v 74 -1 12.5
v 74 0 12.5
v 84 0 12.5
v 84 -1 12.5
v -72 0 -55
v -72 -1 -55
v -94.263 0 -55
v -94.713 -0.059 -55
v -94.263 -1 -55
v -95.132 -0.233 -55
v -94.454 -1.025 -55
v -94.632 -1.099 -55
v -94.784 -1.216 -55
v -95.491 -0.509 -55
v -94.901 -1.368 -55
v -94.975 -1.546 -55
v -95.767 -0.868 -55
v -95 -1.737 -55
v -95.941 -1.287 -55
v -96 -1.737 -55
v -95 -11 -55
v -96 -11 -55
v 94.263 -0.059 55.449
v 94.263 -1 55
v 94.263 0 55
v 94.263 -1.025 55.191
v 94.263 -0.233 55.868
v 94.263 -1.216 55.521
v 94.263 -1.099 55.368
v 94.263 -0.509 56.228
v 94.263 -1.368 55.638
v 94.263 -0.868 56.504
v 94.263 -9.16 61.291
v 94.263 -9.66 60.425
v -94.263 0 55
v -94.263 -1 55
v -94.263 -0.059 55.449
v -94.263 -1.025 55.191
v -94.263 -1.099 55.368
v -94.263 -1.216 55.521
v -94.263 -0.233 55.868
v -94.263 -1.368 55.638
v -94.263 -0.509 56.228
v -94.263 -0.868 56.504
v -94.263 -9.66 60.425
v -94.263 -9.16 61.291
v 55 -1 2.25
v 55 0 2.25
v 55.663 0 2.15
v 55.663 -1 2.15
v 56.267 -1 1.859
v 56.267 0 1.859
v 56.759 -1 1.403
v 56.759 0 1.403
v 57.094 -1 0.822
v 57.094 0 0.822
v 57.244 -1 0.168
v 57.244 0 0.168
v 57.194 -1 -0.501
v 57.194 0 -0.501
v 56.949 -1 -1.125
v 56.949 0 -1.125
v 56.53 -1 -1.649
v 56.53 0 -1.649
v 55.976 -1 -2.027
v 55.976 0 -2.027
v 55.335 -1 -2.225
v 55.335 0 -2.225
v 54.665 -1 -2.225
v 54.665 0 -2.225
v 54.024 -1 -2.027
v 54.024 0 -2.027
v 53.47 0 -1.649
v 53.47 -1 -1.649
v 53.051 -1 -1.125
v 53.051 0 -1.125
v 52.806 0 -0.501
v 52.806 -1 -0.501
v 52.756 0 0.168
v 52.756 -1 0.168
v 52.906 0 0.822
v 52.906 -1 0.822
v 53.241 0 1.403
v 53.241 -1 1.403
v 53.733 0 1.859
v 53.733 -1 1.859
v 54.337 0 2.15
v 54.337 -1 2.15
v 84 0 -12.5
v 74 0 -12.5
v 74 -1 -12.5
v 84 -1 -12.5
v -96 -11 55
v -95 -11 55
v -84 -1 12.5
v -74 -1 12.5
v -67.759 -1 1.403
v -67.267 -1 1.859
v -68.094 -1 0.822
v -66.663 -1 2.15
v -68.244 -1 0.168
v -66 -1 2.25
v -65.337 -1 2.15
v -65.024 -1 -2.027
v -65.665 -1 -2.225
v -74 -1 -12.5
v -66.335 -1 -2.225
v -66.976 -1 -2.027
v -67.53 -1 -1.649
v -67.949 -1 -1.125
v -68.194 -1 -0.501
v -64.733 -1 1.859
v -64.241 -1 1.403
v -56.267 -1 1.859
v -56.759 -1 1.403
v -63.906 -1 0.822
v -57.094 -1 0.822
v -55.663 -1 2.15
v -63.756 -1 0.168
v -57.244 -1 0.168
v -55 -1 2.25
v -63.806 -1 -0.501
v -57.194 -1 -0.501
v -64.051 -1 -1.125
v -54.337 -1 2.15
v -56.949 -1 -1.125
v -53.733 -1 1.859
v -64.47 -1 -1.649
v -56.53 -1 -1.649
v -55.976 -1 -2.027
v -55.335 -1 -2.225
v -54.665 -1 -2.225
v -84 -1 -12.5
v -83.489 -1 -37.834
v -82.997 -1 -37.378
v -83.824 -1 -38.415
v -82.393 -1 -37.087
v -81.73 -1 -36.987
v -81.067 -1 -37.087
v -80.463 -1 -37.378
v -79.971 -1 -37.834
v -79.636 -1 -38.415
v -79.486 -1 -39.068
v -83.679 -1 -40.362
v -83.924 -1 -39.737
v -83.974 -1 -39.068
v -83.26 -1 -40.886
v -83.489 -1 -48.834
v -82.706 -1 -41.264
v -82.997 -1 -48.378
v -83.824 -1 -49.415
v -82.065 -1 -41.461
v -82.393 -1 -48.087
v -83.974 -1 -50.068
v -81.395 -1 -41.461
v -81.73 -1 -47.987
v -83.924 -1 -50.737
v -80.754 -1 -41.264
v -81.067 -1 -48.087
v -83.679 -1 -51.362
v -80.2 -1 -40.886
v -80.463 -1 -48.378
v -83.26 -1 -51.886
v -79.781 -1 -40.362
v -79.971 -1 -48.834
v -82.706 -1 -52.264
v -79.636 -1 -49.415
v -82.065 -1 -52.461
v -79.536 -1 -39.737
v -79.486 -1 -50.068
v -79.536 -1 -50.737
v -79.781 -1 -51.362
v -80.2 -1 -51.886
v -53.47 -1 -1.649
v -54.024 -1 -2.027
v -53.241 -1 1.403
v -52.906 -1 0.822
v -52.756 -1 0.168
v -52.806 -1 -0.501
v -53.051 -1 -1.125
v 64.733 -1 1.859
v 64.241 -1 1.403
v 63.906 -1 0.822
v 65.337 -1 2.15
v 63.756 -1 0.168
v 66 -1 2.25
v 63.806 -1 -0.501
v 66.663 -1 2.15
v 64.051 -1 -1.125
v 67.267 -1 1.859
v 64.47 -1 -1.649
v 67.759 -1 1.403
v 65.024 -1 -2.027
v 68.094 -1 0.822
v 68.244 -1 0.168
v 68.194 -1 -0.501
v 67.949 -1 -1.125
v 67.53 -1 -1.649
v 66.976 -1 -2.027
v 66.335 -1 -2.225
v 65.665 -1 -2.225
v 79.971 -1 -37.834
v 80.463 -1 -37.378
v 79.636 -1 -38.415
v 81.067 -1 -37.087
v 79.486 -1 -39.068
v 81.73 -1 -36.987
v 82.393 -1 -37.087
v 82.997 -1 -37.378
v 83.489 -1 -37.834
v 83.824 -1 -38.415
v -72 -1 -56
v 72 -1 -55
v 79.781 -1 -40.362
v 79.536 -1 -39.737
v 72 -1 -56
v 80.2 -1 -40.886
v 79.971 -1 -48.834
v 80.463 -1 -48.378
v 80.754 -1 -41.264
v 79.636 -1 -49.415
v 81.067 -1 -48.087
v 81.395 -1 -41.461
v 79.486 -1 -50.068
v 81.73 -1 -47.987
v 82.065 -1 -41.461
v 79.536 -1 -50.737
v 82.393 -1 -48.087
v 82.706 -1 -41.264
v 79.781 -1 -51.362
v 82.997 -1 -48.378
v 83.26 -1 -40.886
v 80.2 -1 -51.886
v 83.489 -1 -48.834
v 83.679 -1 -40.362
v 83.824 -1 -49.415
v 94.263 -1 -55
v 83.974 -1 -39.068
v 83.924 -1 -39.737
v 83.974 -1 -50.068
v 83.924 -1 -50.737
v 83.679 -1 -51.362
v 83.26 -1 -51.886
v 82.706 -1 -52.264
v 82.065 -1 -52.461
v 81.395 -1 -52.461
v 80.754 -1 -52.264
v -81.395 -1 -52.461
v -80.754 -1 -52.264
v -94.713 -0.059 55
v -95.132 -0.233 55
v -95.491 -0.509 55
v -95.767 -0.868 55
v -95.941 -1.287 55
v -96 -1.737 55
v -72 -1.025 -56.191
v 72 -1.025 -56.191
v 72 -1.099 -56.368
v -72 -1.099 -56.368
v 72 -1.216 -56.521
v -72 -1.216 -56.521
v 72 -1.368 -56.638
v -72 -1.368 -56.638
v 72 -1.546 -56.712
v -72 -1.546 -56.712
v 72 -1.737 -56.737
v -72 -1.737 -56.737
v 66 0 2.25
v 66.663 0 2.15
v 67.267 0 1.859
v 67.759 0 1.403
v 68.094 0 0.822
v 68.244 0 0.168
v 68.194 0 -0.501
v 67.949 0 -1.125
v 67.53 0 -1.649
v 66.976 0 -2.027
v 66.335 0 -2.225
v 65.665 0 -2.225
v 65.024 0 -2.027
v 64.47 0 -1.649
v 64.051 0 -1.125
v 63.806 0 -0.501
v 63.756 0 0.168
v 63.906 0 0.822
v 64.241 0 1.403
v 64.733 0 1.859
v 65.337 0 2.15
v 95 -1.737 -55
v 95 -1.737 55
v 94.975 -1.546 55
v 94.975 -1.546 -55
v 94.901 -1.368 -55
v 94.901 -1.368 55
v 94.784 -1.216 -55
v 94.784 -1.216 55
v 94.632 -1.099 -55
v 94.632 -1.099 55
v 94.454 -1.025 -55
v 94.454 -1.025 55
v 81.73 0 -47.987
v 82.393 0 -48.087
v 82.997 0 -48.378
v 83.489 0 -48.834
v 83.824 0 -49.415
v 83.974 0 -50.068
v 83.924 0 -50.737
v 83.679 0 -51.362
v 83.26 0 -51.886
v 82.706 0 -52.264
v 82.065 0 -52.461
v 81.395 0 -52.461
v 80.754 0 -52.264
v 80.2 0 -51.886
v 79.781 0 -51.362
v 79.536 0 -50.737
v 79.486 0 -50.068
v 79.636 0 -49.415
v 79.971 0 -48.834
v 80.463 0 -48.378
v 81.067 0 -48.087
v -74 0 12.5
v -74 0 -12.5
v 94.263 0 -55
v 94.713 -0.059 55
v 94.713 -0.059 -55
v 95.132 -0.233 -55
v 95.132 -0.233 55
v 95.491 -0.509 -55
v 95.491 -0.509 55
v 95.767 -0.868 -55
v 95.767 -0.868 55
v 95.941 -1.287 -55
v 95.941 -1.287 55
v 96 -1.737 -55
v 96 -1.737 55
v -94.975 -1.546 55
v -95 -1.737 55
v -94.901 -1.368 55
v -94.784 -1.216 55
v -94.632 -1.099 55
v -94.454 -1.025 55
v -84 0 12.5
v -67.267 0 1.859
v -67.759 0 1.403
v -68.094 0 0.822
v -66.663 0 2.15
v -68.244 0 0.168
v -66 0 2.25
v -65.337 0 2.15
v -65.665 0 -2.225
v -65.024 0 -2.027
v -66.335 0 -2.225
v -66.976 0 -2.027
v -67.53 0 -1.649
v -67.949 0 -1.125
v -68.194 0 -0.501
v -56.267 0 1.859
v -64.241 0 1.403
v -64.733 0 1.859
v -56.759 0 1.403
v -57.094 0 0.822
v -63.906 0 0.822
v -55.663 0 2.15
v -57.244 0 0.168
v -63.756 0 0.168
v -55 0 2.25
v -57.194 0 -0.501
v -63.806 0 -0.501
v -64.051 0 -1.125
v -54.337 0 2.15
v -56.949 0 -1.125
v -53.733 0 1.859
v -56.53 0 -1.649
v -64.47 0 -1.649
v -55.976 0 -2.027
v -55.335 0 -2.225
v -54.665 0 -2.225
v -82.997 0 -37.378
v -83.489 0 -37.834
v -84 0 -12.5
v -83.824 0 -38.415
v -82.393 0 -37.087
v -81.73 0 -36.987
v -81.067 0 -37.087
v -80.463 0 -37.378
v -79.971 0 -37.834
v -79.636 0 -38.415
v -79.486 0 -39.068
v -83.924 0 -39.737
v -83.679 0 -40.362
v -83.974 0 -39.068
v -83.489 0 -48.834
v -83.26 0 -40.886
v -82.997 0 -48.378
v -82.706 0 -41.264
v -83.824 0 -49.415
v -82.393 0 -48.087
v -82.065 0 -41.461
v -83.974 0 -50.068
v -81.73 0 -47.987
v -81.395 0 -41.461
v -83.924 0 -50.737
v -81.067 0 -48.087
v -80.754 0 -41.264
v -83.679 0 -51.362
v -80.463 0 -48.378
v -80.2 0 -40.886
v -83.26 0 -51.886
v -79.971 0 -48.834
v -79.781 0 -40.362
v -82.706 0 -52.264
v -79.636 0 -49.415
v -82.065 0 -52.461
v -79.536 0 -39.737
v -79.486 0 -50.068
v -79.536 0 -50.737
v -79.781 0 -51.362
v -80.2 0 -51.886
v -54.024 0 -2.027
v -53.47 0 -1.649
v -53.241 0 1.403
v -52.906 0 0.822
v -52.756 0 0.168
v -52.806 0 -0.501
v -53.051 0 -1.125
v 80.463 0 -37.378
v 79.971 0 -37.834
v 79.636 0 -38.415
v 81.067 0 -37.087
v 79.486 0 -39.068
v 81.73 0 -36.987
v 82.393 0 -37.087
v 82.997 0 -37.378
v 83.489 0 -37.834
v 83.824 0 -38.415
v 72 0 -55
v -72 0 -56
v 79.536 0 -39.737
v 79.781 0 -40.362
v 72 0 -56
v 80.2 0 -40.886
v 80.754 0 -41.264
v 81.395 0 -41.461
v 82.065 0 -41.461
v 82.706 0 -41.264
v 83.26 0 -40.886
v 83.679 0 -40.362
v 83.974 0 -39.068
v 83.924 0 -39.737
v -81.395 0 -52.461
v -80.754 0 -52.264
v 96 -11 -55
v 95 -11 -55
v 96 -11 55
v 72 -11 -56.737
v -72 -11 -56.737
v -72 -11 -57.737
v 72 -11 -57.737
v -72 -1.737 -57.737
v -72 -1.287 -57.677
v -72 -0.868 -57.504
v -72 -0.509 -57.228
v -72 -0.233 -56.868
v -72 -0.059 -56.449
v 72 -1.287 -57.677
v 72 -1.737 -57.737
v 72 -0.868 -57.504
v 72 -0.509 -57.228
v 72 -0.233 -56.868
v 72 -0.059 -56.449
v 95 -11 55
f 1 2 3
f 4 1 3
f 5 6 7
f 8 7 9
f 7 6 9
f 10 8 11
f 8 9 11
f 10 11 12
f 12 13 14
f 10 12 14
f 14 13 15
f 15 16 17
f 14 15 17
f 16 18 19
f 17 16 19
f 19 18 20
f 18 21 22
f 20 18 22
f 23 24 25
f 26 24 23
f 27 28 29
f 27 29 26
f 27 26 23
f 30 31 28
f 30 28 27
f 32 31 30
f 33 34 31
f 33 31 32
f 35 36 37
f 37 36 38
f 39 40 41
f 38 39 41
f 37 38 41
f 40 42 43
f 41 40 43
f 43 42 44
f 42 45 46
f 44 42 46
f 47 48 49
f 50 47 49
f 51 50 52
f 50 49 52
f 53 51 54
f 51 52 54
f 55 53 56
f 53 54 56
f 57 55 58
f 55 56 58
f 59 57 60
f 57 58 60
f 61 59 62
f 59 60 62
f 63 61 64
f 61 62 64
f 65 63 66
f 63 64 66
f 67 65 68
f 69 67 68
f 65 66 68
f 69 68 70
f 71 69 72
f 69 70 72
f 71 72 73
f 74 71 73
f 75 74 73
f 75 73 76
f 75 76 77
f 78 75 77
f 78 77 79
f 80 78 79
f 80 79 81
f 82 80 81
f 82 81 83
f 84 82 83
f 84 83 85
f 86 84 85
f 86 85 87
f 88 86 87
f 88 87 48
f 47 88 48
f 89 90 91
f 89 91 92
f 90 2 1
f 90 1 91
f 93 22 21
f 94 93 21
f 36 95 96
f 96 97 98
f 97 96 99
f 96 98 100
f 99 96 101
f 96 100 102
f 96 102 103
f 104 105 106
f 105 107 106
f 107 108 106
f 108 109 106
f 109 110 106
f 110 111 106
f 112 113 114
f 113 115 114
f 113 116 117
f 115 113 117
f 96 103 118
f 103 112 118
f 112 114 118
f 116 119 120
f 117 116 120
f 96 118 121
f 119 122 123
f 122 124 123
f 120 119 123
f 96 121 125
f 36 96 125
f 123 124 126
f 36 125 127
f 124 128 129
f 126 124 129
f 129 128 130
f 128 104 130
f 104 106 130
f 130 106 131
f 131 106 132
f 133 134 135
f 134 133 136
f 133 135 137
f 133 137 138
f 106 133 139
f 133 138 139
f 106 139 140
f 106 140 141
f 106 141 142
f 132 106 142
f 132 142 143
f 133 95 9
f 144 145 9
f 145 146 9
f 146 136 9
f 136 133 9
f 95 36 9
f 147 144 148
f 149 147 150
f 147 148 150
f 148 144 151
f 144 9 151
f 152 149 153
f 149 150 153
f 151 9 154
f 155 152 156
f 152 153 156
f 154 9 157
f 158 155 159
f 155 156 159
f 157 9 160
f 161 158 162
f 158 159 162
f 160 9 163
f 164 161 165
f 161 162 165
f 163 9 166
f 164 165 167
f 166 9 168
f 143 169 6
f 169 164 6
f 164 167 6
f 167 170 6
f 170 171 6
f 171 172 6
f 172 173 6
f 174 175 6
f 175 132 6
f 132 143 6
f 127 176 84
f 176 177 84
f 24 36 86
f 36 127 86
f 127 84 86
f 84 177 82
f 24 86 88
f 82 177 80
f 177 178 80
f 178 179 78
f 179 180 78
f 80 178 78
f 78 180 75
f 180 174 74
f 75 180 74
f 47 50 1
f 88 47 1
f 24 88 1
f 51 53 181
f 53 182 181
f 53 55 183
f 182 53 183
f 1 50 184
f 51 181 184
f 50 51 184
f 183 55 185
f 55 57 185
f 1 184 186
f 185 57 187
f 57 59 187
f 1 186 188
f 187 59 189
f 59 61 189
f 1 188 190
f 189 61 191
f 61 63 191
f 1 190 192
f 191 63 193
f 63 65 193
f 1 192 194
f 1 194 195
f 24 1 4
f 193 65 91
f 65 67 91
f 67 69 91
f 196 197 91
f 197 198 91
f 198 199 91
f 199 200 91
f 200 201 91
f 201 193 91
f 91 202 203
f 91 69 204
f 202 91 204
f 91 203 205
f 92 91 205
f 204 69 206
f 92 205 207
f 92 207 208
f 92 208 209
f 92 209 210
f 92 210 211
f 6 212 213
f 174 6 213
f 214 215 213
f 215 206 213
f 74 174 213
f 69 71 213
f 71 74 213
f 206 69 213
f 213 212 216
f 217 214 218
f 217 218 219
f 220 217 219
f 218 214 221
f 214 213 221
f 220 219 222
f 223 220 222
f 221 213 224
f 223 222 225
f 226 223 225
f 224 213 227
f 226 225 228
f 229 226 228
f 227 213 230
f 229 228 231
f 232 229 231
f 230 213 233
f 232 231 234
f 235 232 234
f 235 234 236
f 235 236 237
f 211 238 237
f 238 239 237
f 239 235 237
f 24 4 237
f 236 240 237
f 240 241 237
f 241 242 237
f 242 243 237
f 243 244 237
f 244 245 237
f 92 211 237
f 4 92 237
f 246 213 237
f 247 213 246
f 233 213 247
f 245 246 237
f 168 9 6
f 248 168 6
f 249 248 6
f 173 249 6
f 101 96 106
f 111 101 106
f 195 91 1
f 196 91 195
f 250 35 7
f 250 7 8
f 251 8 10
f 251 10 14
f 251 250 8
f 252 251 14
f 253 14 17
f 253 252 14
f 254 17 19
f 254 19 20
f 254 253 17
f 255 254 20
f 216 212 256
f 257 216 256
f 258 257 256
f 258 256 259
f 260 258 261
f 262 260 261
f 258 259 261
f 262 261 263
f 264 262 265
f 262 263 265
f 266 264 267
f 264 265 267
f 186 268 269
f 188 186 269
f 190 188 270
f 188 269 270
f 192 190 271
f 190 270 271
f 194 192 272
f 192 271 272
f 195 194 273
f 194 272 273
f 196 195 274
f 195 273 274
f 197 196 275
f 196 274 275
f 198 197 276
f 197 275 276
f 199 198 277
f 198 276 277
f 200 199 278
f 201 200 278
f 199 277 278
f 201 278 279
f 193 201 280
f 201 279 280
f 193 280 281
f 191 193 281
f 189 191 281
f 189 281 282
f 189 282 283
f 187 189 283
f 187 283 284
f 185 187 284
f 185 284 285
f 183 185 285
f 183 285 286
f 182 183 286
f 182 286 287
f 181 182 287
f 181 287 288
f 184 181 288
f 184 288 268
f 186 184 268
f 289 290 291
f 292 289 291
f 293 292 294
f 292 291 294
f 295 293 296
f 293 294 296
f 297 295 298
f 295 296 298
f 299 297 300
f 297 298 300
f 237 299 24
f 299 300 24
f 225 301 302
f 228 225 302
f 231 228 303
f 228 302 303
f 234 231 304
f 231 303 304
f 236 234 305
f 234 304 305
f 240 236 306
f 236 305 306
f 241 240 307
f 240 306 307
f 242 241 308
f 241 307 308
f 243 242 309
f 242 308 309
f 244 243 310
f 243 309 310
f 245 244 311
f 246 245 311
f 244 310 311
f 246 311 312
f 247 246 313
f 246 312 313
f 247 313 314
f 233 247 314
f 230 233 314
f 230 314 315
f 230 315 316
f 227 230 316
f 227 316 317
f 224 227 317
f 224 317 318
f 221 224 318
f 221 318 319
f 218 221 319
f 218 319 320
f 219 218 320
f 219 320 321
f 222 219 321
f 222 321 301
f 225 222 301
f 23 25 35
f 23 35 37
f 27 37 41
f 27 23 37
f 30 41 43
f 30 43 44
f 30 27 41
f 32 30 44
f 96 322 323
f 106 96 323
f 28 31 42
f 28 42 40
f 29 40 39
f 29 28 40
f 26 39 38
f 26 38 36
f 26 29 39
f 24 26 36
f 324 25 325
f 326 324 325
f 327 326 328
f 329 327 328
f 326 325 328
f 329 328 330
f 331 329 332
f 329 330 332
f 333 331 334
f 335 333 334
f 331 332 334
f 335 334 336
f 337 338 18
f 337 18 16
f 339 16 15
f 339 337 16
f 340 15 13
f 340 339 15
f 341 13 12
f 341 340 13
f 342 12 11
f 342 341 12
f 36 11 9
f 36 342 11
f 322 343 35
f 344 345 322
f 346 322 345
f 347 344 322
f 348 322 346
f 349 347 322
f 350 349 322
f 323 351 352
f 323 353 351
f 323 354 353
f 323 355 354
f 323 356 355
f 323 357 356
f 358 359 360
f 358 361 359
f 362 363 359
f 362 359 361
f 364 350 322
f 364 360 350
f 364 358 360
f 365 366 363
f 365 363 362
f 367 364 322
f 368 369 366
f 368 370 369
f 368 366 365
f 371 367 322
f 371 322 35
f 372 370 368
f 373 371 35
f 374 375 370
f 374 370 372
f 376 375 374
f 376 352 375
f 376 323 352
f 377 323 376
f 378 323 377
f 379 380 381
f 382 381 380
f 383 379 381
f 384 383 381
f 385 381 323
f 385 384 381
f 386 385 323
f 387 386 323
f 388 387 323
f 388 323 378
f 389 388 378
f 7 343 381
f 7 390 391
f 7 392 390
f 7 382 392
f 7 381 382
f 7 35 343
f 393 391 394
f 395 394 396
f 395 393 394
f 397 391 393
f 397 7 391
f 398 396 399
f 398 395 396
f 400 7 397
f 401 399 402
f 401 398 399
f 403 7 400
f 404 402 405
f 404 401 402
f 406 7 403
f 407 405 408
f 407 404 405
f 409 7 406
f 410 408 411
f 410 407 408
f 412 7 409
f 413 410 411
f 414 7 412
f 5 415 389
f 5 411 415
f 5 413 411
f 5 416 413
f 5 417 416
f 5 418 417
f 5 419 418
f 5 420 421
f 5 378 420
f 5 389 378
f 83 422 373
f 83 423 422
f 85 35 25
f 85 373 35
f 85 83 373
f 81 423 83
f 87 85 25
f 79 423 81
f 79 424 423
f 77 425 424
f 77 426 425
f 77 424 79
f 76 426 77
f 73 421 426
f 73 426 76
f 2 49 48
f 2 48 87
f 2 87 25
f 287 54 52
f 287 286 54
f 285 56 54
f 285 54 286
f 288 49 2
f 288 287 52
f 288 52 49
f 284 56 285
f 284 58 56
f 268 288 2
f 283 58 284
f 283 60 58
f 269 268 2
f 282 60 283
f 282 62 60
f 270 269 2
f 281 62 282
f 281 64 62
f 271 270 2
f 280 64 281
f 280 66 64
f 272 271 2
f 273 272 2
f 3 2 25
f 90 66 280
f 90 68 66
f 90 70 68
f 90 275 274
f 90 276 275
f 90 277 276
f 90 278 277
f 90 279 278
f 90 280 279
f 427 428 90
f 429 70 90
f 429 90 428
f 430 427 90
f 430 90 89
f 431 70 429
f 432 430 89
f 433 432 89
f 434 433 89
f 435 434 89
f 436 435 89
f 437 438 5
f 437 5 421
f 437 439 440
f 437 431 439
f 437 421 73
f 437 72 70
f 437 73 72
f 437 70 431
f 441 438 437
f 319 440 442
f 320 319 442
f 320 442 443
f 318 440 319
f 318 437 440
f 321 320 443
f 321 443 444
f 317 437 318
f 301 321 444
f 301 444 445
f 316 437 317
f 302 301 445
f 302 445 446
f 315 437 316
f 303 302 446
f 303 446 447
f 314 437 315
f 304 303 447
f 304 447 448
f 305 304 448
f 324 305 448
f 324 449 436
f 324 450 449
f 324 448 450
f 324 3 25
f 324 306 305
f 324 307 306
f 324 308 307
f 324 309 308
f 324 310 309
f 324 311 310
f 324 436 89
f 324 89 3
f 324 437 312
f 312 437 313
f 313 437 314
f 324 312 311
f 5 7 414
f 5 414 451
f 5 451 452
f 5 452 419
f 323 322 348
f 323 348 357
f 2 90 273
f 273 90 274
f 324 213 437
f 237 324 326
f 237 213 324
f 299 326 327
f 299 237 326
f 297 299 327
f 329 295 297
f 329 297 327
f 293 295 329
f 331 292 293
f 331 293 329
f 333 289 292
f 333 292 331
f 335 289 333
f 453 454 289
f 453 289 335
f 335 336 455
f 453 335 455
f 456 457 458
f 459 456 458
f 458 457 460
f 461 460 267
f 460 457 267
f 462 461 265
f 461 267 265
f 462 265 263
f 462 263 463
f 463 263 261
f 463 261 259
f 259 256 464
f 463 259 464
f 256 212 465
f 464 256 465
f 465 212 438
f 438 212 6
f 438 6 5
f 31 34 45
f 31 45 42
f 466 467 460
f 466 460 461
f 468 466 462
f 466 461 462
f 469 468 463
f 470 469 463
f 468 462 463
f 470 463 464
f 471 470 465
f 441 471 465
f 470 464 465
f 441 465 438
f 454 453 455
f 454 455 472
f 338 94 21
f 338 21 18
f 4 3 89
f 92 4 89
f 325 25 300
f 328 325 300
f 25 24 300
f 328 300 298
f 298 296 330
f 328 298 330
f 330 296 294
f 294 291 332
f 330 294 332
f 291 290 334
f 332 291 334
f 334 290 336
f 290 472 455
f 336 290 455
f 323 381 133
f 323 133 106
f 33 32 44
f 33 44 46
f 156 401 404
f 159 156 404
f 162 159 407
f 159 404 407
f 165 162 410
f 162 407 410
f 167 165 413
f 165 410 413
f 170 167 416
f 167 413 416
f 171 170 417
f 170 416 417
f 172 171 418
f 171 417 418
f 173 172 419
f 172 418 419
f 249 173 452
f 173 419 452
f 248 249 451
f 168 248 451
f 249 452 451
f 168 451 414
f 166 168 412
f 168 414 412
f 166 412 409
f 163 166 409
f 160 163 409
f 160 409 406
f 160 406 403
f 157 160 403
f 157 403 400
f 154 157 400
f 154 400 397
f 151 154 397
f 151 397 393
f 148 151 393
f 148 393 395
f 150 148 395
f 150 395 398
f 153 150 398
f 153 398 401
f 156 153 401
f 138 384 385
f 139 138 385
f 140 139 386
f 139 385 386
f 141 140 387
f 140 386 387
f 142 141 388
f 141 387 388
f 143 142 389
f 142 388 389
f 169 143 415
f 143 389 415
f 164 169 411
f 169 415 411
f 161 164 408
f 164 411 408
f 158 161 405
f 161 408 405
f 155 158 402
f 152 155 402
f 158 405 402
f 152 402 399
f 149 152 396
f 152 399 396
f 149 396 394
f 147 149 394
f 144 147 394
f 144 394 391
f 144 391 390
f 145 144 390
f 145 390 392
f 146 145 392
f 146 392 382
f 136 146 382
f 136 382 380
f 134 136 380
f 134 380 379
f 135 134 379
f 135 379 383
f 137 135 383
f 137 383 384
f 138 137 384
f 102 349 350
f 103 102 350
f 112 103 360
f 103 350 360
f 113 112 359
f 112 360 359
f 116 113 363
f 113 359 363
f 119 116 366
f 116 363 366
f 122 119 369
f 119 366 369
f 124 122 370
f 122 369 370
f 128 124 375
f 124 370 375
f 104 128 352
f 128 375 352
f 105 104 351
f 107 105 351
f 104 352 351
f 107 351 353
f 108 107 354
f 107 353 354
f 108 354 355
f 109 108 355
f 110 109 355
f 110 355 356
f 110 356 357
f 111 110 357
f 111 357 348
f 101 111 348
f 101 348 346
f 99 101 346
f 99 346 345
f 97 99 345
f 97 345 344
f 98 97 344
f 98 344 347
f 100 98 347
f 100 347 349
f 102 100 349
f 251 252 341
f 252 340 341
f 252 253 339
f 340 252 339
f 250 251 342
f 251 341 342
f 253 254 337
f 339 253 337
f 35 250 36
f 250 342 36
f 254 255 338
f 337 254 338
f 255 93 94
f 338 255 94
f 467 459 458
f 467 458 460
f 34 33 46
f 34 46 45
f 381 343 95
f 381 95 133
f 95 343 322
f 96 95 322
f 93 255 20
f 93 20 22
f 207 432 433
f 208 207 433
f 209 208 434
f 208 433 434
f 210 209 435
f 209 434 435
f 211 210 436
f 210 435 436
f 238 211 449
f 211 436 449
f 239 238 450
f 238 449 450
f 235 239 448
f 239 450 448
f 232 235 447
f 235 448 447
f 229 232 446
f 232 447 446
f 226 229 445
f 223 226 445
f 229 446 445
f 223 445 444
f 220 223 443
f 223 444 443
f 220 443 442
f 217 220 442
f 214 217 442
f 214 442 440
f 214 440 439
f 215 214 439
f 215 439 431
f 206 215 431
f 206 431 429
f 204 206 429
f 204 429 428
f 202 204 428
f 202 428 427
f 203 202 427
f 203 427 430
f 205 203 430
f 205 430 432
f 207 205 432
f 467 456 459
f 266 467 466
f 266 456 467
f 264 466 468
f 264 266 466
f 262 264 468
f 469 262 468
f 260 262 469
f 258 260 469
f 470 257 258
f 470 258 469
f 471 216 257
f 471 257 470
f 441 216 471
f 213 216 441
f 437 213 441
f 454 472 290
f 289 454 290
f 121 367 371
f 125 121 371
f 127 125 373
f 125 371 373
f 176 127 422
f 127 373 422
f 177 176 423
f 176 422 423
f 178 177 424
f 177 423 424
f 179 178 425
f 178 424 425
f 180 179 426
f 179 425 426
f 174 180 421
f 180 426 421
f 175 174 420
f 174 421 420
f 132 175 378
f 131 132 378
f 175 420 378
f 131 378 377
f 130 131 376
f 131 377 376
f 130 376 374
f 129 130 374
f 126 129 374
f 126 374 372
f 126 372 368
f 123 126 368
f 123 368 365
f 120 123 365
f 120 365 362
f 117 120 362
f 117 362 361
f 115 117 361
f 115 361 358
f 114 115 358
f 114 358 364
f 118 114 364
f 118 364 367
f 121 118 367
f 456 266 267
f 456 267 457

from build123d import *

# Parameters (mm, degrees)
SKETCH1_W                    = 190
SKETCH1_H                    = 110
BASE_FLANGE1_DEPTH           = 1
EDGE_FLANGE1_START           = -72
EDGE_FLANGE1_DEPTH           = 144
EDGE_FLANGE2_STRIP_W         = 5.4732
EDGE_FLANGE2_STRIP_H         = 1
EDGE_FLANGE2_STRIP_CUT_DEPTH = 110
EDGE_FLANGE2_DEPTH           = 110
EDGE_FLANGE3_DEPTH           = 188.5268
SKETCH17_R                   = 2.25
SKETCH17_W                   = 10
SKETCH17_H                   = 25
CUT_EXTRUDE1_DEPTH           = 115.427372832
SKETCH18_R                   = 2.25
CUT_EXTRUDE2_DEPTH           = 115.427372832


# Read off the part's stored shape, not the designer's step: Edge-Flange1
# Sheet-metal steps are written as plain solids
with BuildPart() as part:
    # Sketch1 → Base-Flange1 (new body)
    with BuildSketch(Plane(origin=(0, 0, 0), x_dir=(1, 0, 0), z_dir=(0, 1, 0))):
        Rectangle(SKETCH1_W, SKETCH1_H)
    extrude(amount=-BASE_FLANGE1_DEPTH)

    # Edge-Flange1 outline → Edge-Flange1 (add)
    with BuildSketch(Plane.YZ.offset(EDGE_FLANGE1_START)):
        with BuildLine():
            Line((-11, -57.7366), (-1.7366, -57.7366))
            ThreePointArc((-1.7366, -57.7366), (-0.508638364, -57.227961636), (0, -56))
            Line((0, -56), (0, -55))
            Line((0, -55), (-1, -55))
            Line((-1, -55), (-1, -56))
            ThreePointArc((-1, -56), (-1.215745145, -56.520854855), (-1.7366, -56.7366))
            Line((-1.7366, -56.7366), (-11, -56.7366))
            Line((-11, -56.7366), (-11, -57.7366))
        make_face()
    extrude(amount=EDGE_FLANGE1_DEPTH)

    # Edge-Flange2 strip (across the edge) → Edge-Flange2 strip cut (cut)
    with BuildSketch(Plane(origin=(-95, -1, 55), x_dir=(1, 0, 0), z_dir=(0, 0, -1))):
        with Locations((-2, -0.5)):
            Rectangle(EDGE_FLANGE2_STRIP_W, EDGE_FLANGE2_STRIP_H)
    edge_flange2_strip_cut = extrude(amount=EDGE_FLANGE2_STRIP_CUT_DEPTH, mode=Mode.SUBTRACT)

    # Edge-Flange2 section (across the edge) → Edge-Flange2 (add)
    with BuildSketch(Plane(origin=(-95, -1, 55), x_dir=(1, 0, 0), z_dir=(0, 0, -1))):
        with BuildLine():
            Line((-1, 0.7366), (-1, 10))
            Line((-1, 10), (0, 10))
            Line((0, 10), (0, 0.7366))
            ThreePointArc((0, 0.7366), (0.215745145, 0.215745145), (0.7366, 0))
            Line((0.7366, 0), (0.7366, -1))
            ThreePointArc((0.7366, -1), (-0.491361636, -0.491361636), (-1, 0.7366))
        make_face()
    edge_flange2 = extrude(amount=EDGE_FLANGE2_DEPTH)

    # Mirror1: Edge-Flange2 strip cut, Edge-Flange2 across plane
    add(edge_flange2_strip_cut.mirror(Plane(origin=(0, 0, 0), x_dir=(0, 0, 1), z_dir=(1, 0, 0))), mode=Mode.SUBTRACT)
    add(edge_flange2.mirror(Plane(origin=(0, 0, 0), x_dir=(0, 0, 1), z_dir=(1, 0, 0))))

    # Edge-Flange3 section (across the edge) → Edge-Flange3 (add)
    with BuildSketch(Plane(origin=(94.2634, -1, 55.425276208), x_dir=(0, -0.5000000000000041, -0.8660254037844364), z_dir=(-1, 0, 0))):
        with BuildLine():
            Line((-1, 0.425276208), (-1, 10))
            Line((-1, 10), (0, 10))
            Line((0, 10), (0, 0.425276208))
            ThreePointArc((0, 0.425276208), (0.098685688, 0.056976208), (0.3683, -0.212638104))
            Line((0.3683, -0.212638104), (-0.1317, -1.078663508))
            ThreePointArc((-0.1317, -1.078663508), (-0.767339716, -0.443023792), (-1, 0.425276208))
        make_face()
    extrude(amount=EDGE_FLANGE3_DEPTH)

    # Sketch17 → Cut-Extrude1 (cut, through all)
    with BuildSketch(Plane(origin=(0, 0, 0), x_dir=(1, 0, 0), z_dir=(0, 1, 0))):
        with Locations(Location((66, 0, 0), (0, 0, 270))):
            Circle(SKETCH17_R)
        with Locations(Location((55, 0, 0), (0, 0, 270))):
            Circle(SKETCH17_R)
        with Locations(Location((-55, 0, 0), (0, 0, 270))):
            Circle(SKETCH17_R)
        with Locations(Location((-66, 0, 0), (0, 0, 270))):
            Circle(SKETCH17_R)
        with Locations((79, 0)):
            Rectangle(SKETCH17_W, SKETCH17_H)
        with Locations((-79, 0)):
            Rectangle(SKETCH17_W, SKETCH17_H)
    extrude(amount=-CUT_EXTRUDE1_DEPTH, mode=Mode.SUBTRACT)

    # Sketch18 → Cut-Extrude2 (cut, through all)
    with BuildSketch(Plane(origin=(0, 0, 0), x_dir=(1, 0, 0), z_dir=(0, 1, 0))):
        with Locations(Location((81.73, 50.2366, 0), (0, 0, 270))):
            Circle(SKETCH18_R)
        with Locations(Location((81.73, 39.2366, 0), (0, 0, 270))):
            Circle(SKETCH18_R)
        with Locations(Location((-81.73, 39.2366, 0), (0, 0, 270))):
            Circle(SKETCH18_R)
        with Locations(Location((-81.73, 50.2366, 0), (0, 0, 270))):
            Circle(SKETCH18_R)
    extrude(amount=-CUT_EXTRUDE2_DEPTH, mode=Mode.SUBTRACT)


solid = part.part
